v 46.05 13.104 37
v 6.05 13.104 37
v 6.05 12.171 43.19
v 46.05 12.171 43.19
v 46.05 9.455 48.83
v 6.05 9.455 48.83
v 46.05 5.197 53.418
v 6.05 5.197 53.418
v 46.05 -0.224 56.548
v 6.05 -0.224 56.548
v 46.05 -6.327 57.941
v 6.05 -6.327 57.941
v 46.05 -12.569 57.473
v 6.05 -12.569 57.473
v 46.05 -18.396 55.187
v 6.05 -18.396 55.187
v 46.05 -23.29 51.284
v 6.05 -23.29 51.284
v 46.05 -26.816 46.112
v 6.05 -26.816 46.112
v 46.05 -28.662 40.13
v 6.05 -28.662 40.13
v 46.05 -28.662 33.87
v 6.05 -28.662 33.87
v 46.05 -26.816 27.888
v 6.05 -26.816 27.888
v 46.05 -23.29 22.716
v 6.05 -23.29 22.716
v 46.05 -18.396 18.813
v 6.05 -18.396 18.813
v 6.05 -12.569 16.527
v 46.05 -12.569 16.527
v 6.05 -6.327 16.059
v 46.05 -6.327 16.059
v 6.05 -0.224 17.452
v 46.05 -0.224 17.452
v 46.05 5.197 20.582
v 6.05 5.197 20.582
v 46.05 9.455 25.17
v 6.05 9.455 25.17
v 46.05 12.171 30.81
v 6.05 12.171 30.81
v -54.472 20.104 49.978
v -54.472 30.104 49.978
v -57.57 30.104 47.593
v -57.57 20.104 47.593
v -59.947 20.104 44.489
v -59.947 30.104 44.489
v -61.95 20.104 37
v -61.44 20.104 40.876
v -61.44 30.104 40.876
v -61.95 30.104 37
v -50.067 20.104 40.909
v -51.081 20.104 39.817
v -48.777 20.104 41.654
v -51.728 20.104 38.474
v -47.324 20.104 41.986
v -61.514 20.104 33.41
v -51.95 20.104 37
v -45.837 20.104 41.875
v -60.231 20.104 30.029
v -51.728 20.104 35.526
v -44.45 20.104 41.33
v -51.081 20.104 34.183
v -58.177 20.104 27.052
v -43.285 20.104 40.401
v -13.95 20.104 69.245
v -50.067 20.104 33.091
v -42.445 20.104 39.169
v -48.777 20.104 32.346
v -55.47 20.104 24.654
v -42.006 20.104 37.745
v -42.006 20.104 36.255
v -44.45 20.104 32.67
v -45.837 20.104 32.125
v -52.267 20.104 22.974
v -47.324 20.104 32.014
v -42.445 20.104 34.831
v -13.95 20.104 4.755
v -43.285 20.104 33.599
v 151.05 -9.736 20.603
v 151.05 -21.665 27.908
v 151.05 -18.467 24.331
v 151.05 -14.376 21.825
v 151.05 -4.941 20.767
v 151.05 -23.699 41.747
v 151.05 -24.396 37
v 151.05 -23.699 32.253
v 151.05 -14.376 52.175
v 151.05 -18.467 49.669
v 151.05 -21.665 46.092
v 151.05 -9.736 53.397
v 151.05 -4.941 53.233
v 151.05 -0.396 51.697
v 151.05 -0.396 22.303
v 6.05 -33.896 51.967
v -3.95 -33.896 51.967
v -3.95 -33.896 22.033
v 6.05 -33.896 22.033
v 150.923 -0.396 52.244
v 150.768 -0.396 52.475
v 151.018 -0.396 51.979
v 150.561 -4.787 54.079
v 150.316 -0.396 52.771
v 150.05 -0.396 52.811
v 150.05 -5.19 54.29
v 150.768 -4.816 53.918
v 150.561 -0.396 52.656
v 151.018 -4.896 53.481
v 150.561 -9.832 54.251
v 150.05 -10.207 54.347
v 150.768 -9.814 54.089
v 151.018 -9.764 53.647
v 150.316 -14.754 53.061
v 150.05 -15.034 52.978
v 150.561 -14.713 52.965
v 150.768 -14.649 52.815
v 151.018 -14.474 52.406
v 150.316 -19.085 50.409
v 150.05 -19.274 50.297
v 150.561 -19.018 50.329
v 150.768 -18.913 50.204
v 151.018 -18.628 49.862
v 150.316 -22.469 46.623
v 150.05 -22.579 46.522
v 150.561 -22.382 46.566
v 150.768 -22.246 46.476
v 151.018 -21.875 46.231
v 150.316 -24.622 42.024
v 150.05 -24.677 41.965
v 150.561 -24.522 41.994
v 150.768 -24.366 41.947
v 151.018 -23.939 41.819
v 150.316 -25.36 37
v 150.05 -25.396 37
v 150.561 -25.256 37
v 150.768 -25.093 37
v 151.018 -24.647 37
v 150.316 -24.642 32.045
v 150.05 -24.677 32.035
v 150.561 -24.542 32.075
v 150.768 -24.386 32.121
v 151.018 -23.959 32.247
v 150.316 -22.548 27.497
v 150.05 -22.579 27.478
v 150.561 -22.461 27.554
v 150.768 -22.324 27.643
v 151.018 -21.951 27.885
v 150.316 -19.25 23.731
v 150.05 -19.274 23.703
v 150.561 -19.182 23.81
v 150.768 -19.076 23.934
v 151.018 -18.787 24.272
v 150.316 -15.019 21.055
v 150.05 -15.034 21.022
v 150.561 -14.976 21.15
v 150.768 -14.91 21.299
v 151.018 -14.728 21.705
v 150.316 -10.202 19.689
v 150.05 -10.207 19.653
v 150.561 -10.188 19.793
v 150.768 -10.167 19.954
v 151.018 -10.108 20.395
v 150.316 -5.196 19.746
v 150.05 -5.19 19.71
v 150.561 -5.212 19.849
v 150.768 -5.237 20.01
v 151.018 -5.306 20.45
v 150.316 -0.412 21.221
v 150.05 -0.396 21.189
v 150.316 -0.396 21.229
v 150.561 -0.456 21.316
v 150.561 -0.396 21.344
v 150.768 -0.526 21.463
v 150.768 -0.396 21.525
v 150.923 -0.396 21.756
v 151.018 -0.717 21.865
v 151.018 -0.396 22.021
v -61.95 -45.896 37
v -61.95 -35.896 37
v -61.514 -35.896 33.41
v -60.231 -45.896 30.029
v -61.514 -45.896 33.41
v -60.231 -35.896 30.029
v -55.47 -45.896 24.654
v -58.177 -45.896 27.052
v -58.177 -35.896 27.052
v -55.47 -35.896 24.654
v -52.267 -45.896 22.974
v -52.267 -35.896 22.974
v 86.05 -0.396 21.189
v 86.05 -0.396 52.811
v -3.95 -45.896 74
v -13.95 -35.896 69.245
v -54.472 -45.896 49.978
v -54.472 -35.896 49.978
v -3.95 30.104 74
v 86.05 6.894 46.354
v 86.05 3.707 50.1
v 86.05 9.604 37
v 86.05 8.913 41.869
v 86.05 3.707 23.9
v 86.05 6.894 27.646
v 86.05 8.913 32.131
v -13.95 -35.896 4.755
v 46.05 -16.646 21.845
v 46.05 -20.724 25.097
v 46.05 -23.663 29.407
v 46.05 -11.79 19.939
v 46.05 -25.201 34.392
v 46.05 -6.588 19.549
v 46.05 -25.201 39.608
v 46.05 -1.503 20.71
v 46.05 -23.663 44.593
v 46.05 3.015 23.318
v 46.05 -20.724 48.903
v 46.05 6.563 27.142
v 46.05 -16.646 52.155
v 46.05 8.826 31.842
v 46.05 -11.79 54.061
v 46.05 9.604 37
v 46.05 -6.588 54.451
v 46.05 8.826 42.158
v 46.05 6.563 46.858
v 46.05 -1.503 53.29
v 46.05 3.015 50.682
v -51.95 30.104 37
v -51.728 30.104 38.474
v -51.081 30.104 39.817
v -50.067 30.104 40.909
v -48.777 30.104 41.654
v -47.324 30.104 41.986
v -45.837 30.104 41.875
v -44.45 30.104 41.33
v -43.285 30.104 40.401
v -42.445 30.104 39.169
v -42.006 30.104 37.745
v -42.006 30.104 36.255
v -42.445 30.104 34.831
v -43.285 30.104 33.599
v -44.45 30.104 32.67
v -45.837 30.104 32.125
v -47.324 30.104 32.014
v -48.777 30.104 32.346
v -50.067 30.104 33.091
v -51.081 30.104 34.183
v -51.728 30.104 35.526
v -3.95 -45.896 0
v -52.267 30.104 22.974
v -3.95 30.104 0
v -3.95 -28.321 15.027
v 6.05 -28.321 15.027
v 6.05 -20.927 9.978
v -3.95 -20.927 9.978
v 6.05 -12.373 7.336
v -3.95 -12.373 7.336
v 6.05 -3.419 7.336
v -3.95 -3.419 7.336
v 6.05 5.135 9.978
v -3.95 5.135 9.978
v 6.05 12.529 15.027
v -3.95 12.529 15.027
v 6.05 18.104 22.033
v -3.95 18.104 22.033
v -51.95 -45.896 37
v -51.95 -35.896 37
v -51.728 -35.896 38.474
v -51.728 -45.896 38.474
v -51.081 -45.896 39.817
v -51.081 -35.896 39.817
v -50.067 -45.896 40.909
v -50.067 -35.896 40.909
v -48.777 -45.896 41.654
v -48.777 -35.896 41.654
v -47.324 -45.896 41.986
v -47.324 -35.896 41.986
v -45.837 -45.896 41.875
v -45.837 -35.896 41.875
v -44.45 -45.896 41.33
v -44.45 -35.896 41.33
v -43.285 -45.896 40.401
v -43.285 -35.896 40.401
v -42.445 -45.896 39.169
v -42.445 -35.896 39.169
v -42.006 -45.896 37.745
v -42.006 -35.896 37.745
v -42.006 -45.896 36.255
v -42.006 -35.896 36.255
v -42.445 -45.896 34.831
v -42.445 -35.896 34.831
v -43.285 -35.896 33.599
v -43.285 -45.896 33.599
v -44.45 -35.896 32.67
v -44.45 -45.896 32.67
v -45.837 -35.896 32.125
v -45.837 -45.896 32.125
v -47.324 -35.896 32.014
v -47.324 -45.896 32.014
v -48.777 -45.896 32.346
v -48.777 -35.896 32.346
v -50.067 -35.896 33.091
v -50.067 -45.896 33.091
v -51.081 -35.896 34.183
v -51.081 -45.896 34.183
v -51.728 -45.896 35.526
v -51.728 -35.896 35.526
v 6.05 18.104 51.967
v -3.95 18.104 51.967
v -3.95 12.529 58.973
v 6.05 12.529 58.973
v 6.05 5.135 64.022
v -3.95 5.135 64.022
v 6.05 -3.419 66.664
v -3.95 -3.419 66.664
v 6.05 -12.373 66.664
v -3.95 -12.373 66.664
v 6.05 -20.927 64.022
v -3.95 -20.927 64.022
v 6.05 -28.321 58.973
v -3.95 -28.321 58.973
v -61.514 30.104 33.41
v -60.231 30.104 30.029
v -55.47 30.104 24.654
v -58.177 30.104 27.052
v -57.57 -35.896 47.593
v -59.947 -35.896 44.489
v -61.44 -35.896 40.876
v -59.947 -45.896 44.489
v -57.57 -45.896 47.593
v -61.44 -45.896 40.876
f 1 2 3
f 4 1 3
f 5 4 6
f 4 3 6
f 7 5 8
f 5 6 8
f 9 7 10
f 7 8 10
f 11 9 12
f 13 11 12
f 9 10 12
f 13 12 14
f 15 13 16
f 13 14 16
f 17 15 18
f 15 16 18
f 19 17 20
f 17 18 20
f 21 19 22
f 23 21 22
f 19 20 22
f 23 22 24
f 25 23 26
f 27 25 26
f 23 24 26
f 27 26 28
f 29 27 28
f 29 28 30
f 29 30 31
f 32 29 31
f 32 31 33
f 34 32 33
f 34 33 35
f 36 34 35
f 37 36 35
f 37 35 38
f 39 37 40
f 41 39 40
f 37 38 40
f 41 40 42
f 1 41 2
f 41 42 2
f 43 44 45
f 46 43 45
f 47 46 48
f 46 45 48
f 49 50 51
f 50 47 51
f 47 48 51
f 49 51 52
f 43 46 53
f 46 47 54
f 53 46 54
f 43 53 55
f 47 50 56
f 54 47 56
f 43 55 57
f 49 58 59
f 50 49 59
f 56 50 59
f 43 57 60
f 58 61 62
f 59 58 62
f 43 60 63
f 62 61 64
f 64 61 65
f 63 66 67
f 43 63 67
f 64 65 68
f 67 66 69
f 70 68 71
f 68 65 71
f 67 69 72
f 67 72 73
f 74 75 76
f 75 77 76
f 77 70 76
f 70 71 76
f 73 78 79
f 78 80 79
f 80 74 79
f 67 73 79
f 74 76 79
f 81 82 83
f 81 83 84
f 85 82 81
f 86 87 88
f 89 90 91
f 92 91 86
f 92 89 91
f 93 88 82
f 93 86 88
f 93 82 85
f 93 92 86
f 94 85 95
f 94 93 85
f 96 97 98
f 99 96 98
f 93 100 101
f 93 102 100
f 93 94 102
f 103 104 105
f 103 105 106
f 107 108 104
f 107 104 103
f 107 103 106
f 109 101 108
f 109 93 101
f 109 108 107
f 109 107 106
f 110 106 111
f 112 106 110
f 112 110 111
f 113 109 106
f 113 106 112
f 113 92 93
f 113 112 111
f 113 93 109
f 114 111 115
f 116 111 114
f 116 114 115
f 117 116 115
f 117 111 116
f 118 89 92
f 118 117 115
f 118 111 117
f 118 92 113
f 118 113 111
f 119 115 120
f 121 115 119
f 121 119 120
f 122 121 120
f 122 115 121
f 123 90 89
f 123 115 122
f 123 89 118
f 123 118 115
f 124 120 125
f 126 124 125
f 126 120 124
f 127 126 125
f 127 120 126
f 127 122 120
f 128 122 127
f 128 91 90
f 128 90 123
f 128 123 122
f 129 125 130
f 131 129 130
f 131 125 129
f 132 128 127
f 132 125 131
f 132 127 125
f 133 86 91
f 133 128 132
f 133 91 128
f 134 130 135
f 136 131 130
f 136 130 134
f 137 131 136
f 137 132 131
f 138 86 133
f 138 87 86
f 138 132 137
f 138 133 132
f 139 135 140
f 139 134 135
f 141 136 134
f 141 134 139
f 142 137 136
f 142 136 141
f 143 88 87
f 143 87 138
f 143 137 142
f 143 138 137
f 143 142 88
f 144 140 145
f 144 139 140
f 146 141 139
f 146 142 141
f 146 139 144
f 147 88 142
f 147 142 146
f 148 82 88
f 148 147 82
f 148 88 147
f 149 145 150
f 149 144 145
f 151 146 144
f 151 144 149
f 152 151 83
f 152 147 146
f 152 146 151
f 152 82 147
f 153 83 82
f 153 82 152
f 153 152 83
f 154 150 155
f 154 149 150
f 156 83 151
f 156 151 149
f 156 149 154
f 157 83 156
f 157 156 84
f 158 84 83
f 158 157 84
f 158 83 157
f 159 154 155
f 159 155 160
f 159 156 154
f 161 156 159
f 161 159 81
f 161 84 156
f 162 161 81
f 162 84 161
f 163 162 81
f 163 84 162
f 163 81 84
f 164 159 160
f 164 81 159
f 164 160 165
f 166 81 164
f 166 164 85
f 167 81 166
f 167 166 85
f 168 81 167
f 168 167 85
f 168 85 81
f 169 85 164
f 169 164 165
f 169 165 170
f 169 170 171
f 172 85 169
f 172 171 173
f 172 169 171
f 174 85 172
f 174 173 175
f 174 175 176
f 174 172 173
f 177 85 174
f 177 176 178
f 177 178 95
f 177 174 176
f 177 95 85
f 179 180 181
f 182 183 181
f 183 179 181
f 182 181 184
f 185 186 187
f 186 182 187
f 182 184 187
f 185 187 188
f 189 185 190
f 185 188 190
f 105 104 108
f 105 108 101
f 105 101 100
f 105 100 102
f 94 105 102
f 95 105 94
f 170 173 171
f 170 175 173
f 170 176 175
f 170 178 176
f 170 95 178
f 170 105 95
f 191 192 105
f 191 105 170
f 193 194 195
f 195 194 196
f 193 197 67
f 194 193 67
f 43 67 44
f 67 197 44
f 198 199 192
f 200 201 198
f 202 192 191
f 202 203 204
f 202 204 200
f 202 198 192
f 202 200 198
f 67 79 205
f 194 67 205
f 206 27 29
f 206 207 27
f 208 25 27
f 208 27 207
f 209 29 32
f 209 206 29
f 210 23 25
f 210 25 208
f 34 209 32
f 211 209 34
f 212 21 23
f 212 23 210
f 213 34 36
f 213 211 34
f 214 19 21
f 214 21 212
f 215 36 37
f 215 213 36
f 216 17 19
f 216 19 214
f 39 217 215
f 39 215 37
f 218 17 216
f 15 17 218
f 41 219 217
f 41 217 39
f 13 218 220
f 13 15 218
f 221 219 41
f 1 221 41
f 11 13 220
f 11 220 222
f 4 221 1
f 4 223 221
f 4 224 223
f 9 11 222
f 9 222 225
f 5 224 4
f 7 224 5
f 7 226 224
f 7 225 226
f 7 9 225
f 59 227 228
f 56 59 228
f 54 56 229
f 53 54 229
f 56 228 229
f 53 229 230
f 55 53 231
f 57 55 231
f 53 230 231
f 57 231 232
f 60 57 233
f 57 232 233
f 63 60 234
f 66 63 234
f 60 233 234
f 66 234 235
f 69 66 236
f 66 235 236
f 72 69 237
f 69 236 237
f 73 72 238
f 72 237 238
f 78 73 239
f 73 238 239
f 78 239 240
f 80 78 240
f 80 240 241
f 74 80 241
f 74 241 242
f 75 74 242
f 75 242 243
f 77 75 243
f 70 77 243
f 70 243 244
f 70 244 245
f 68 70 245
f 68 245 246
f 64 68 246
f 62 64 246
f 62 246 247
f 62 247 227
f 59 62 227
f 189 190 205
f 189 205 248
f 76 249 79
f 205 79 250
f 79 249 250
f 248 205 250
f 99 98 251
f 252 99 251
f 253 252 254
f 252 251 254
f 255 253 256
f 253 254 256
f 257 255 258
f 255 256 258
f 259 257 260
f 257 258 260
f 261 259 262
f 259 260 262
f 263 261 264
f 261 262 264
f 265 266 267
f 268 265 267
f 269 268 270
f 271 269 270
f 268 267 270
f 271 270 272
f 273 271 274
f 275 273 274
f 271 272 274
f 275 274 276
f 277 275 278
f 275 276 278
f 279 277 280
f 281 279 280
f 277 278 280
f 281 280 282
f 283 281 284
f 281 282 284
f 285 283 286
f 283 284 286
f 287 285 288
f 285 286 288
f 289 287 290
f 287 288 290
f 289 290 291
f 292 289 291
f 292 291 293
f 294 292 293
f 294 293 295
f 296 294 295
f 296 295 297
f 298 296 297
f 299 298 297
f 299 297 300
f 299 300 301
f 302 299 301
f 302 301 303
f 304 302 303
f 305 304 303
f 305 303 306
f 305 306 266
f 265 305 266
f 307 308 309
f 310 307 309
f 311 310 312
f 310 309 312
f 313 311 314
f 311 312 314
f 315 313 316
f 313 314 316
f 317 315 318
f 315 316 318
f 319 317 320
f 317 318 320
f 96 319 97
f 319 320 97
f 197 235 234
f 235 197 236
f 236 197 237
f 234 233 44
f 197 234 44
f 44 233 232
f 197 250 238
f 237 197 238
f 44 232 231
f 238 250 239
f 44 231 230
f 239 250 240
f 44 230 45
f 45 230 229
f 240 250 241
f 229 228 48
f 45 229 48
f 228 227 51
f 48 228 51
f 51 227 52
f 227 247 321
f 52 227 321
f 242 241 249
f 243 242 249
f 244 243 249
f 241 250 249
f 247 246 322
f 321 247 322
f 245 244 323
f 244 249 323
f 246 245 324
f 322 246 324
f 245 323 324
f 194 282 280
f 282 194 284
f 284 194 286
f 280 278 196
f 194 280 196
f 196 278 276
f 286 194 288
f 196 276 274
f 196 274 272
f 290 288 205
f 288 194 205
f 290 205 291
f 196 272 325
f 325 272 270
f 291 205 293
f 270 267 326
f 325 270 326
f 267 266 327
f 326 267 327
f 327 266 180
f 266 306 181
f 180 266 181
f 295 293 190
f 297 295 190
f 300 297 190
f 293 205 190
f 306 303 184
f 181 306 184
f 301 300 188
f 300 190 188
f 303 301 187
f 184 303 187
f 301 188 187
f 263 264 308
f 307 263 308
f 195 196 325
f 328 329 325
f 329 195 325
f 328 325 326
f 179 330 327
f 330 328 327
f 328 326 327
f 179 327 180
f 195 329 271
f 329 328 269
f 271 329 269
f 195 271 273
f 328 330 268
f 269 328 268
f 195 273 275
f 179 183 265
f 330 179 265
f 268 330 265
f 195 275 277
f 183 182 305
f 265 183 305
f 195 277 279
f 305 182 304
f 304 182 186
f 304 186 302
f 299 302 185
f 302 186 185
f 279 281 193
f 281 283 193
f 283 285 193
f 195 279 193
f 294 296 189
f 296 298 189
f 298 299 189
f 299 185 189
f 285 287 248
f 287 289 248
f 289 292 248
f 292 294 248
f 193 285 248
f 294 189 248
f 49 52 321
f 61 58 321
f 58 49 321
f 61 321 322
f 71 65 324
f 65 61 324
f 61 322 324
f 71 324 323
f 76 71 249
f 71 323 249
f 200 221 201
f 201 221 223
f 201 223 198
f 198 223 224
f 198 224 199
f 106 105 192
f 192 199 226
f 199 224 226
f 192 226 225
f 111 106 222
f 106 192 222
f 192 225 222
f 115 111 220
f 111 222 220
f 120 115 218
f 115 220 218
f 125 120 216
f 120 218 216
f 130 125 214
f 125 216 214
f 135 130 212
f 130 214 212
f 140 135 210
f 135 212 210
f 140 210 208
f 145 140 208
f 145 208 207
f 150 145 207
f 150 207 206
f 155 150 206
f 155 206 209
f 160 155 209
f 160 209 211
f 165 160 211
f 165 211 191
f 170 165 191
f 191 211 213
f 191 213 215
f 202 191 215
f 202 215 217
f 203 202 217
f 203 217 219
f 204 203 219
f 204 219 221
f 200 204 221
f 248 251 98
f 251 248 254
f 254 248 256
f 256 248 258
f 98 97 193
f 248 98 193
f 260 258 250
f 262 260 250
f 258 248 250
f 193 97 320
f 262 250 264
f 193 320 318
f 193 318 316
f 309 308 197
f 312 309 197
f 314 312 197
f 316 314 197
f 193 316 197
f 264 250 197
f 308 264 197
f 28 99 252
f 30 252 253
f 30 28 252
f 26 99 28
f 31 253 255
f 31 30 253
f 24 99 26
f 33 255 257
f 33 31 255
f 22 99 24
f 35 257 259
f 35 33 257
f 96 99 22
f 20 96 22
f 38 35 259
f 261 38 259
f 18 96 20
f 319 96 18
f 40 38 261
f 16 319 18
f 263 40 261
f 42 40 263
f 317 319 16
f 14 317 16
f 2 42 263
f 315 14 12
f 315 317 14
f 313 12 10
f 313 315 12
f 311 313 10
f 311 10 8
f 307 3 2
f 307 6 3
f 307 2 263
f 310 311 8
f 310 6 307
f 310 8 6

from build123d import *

# Parameters (mm, degrees)
BOSS_EXTRUDE1_DEPTH = 74
CUT_EXTRUDE1_DEPTH  = 100
SKETCH3_R           = 5
CUT_EXTRUDE2_DEPTH  = 100
F_3DSKETCH4_R       = 30
BOSS_EXTRUDE2_DEPTH = 15
F_3DSKETCH5_R       = 21
BOSS_EXTRUDE3_DEPTH = 45
F_3DSKETCH6_R       = 17.5
BOSS_EXTRUDE4_DEPTH = 110
FILLET1_R           = 1
CUT_EXTRUDE3_START  = -65
CUT_EXTRUDE3_DEPTH  = 65
CUT_EXTRUDE4_START  = -10
CUT_EXTRUDE4_DEPTH  = 10


with BuildPart() as part:
    # Sketch1 → Boss-Extrude1 (new body)
    with BuildSketch(Plane.XY):
        Polygon((-61.949924481, 30.103941839), (-61.949924481, 20.103941839), (-13.949924481, 20.103941839), (-13.949924481, -35.896058161), (-61.949924481, -35.896058161), (-61.949924481, -45.896058161), (-3.949924481, -45.896058161), (-3.949924481, 30.103941839), align=None)
    extrude(amount=BOSS_EXTRUDE1_DEPTH)

    # Sketch2 → Cut-Extrude1 (cut)
    with BuildSketch(Plane(origin=(0, 30.103941839, 0), x_dir=(1, 0, 0), z_dir=(0, 1, 0))):
        with BuildLine():
            Line((-61.949924481, -74), (-3.949924481, -74))
            Line((-3.949924481, -74), (-54.47214826, -49.97752478))
            ThreePointArc((-54.47214826, -49.97752478), (-59.946719407, -44.488879866), (-61.949924481, -37))
            Line((-61.949924481, -37), (-61.949924481, -74))
        make_face()
        with BuildLine():
            Line((-61.949924481, 0), (-61.949924481, -37))
            ThreePointArc((-61.949924481, -37), (-59.294185522, -28.478308892), (-52.267361901, -22.974136059))
            Line((-52.267361901, -22.974136059), (-3.949924481, 0))
            Line((-3.949924481, 0), (-61.949924481, 0))
        make_face()
    extrude(amount=-CUT_EXTRUDE1_DEPTH, mode=Mode.SUBTRACT)

    # Sketch3 → Cut-Extrude2 (cut)
    with BuildSketch(Plane(origin=(0, 30.103941839, 0), x_dir=(1, 0, 0), z_dir=(0, 1, 0))):
        with Locations((-46.949924481, -37)):
            Circle(SKETCH3_R)
    extrude(amount=-CUT_EXTRUDE2_DEPTH, mode=Mode.SUBTRACT)

    # 3DSketch4 → Boss-Extrude2 (add)
    with BuildSketch(Plane(origin=(-8.949924481, -7.896058161, 37), x_dir=(0, 0, 1), z_dir=(1, 0, 0))):
        Circle(F_3DSKETCH4_R)
    extrude(amount=BOSS_EXTRUDE2_DEPTH)

    # 3DSketch5 → Boss-Extrude3 (add)
    with BuildSketch(Plane(origin=(1.050075519, -7.896058161, 37), x_dir=(0, 0, 1), z_dir=(1, 0, 0))):
        Circle(F_3DSKETCH5_R)
    extrude(amount=BOSS_EXTRUDE3_DEPTH)

    # 3DSketch6 → Boss-Extrude4 (add)
    with BuildSketch(Plane(origin=(41.050075519, -7.896058161, 37), x_dir=(0, 0, 1), z_dir=(1, 0, 0))):
        Circle(F_3DSKETCH6_R)
    extrude(amount=BOSS_EXTRUDE4_DEPTH)

    # Fillet1
    fillet1_edges = [part.edges().sort_by_distance(p)[0] for p in [
        (151.050075519, -7.896058161, 19.5),
    ]]
    fillet(fillet1_edges, radius=FILLET1_R)

    # Sketch4 → Cut-Extrude3 (cut)
    with BuildSketch(Plane(origin=(151.050075519, 0, 0), x_dir=(0, 0, -1), z_dir=(1, 0, 0)).offset(CUT_EXTRUDE3_START)):
        with BuildLine():
            Line((-52.811388301, -0.396058161), (-21.188611699, -0.396058161))
            ThreePointArc((-21.188611699, -0.396058161), (-37, 9.603941839), (-52.811388301, -0.396058161))
        make_face()
    extrude(amount=CUT_EXTRUDE3_DEPTH, mode=Mode.SUBTRACT)

    # Sketch5 → Cut-Extrude4 (cut)
    with BuildSketch(Plane(origin=(6.050075519, 0, 0), x_dir=(0, 0, -1), z_dir=(1, 0, 0)).offset(CUT_EXTRUDE4_START)):
        with BuildLine():
            Line((-22.033370453, 18.103941839), (-51.966629547, 18.103941839))
            ThreePointArc((-51.966629547, 18.103941839), (-37, 22.103941839), (-22.033370453, 18.103941839))
        make_face()
        with BuildLine():
            Line((-51.966629547, -33.896058161), (-22.033370453, -33.896058161))
            ThreePointArc((-22.033370453, -33.896058161), (-37, -37.896058161), (-51.966629547, -33.896058161))
        make_face()
    extrude(amount=CUT_EXTRUDE4_DEPTH, mode=Mode.SUBTRACT)


solid = part.part
